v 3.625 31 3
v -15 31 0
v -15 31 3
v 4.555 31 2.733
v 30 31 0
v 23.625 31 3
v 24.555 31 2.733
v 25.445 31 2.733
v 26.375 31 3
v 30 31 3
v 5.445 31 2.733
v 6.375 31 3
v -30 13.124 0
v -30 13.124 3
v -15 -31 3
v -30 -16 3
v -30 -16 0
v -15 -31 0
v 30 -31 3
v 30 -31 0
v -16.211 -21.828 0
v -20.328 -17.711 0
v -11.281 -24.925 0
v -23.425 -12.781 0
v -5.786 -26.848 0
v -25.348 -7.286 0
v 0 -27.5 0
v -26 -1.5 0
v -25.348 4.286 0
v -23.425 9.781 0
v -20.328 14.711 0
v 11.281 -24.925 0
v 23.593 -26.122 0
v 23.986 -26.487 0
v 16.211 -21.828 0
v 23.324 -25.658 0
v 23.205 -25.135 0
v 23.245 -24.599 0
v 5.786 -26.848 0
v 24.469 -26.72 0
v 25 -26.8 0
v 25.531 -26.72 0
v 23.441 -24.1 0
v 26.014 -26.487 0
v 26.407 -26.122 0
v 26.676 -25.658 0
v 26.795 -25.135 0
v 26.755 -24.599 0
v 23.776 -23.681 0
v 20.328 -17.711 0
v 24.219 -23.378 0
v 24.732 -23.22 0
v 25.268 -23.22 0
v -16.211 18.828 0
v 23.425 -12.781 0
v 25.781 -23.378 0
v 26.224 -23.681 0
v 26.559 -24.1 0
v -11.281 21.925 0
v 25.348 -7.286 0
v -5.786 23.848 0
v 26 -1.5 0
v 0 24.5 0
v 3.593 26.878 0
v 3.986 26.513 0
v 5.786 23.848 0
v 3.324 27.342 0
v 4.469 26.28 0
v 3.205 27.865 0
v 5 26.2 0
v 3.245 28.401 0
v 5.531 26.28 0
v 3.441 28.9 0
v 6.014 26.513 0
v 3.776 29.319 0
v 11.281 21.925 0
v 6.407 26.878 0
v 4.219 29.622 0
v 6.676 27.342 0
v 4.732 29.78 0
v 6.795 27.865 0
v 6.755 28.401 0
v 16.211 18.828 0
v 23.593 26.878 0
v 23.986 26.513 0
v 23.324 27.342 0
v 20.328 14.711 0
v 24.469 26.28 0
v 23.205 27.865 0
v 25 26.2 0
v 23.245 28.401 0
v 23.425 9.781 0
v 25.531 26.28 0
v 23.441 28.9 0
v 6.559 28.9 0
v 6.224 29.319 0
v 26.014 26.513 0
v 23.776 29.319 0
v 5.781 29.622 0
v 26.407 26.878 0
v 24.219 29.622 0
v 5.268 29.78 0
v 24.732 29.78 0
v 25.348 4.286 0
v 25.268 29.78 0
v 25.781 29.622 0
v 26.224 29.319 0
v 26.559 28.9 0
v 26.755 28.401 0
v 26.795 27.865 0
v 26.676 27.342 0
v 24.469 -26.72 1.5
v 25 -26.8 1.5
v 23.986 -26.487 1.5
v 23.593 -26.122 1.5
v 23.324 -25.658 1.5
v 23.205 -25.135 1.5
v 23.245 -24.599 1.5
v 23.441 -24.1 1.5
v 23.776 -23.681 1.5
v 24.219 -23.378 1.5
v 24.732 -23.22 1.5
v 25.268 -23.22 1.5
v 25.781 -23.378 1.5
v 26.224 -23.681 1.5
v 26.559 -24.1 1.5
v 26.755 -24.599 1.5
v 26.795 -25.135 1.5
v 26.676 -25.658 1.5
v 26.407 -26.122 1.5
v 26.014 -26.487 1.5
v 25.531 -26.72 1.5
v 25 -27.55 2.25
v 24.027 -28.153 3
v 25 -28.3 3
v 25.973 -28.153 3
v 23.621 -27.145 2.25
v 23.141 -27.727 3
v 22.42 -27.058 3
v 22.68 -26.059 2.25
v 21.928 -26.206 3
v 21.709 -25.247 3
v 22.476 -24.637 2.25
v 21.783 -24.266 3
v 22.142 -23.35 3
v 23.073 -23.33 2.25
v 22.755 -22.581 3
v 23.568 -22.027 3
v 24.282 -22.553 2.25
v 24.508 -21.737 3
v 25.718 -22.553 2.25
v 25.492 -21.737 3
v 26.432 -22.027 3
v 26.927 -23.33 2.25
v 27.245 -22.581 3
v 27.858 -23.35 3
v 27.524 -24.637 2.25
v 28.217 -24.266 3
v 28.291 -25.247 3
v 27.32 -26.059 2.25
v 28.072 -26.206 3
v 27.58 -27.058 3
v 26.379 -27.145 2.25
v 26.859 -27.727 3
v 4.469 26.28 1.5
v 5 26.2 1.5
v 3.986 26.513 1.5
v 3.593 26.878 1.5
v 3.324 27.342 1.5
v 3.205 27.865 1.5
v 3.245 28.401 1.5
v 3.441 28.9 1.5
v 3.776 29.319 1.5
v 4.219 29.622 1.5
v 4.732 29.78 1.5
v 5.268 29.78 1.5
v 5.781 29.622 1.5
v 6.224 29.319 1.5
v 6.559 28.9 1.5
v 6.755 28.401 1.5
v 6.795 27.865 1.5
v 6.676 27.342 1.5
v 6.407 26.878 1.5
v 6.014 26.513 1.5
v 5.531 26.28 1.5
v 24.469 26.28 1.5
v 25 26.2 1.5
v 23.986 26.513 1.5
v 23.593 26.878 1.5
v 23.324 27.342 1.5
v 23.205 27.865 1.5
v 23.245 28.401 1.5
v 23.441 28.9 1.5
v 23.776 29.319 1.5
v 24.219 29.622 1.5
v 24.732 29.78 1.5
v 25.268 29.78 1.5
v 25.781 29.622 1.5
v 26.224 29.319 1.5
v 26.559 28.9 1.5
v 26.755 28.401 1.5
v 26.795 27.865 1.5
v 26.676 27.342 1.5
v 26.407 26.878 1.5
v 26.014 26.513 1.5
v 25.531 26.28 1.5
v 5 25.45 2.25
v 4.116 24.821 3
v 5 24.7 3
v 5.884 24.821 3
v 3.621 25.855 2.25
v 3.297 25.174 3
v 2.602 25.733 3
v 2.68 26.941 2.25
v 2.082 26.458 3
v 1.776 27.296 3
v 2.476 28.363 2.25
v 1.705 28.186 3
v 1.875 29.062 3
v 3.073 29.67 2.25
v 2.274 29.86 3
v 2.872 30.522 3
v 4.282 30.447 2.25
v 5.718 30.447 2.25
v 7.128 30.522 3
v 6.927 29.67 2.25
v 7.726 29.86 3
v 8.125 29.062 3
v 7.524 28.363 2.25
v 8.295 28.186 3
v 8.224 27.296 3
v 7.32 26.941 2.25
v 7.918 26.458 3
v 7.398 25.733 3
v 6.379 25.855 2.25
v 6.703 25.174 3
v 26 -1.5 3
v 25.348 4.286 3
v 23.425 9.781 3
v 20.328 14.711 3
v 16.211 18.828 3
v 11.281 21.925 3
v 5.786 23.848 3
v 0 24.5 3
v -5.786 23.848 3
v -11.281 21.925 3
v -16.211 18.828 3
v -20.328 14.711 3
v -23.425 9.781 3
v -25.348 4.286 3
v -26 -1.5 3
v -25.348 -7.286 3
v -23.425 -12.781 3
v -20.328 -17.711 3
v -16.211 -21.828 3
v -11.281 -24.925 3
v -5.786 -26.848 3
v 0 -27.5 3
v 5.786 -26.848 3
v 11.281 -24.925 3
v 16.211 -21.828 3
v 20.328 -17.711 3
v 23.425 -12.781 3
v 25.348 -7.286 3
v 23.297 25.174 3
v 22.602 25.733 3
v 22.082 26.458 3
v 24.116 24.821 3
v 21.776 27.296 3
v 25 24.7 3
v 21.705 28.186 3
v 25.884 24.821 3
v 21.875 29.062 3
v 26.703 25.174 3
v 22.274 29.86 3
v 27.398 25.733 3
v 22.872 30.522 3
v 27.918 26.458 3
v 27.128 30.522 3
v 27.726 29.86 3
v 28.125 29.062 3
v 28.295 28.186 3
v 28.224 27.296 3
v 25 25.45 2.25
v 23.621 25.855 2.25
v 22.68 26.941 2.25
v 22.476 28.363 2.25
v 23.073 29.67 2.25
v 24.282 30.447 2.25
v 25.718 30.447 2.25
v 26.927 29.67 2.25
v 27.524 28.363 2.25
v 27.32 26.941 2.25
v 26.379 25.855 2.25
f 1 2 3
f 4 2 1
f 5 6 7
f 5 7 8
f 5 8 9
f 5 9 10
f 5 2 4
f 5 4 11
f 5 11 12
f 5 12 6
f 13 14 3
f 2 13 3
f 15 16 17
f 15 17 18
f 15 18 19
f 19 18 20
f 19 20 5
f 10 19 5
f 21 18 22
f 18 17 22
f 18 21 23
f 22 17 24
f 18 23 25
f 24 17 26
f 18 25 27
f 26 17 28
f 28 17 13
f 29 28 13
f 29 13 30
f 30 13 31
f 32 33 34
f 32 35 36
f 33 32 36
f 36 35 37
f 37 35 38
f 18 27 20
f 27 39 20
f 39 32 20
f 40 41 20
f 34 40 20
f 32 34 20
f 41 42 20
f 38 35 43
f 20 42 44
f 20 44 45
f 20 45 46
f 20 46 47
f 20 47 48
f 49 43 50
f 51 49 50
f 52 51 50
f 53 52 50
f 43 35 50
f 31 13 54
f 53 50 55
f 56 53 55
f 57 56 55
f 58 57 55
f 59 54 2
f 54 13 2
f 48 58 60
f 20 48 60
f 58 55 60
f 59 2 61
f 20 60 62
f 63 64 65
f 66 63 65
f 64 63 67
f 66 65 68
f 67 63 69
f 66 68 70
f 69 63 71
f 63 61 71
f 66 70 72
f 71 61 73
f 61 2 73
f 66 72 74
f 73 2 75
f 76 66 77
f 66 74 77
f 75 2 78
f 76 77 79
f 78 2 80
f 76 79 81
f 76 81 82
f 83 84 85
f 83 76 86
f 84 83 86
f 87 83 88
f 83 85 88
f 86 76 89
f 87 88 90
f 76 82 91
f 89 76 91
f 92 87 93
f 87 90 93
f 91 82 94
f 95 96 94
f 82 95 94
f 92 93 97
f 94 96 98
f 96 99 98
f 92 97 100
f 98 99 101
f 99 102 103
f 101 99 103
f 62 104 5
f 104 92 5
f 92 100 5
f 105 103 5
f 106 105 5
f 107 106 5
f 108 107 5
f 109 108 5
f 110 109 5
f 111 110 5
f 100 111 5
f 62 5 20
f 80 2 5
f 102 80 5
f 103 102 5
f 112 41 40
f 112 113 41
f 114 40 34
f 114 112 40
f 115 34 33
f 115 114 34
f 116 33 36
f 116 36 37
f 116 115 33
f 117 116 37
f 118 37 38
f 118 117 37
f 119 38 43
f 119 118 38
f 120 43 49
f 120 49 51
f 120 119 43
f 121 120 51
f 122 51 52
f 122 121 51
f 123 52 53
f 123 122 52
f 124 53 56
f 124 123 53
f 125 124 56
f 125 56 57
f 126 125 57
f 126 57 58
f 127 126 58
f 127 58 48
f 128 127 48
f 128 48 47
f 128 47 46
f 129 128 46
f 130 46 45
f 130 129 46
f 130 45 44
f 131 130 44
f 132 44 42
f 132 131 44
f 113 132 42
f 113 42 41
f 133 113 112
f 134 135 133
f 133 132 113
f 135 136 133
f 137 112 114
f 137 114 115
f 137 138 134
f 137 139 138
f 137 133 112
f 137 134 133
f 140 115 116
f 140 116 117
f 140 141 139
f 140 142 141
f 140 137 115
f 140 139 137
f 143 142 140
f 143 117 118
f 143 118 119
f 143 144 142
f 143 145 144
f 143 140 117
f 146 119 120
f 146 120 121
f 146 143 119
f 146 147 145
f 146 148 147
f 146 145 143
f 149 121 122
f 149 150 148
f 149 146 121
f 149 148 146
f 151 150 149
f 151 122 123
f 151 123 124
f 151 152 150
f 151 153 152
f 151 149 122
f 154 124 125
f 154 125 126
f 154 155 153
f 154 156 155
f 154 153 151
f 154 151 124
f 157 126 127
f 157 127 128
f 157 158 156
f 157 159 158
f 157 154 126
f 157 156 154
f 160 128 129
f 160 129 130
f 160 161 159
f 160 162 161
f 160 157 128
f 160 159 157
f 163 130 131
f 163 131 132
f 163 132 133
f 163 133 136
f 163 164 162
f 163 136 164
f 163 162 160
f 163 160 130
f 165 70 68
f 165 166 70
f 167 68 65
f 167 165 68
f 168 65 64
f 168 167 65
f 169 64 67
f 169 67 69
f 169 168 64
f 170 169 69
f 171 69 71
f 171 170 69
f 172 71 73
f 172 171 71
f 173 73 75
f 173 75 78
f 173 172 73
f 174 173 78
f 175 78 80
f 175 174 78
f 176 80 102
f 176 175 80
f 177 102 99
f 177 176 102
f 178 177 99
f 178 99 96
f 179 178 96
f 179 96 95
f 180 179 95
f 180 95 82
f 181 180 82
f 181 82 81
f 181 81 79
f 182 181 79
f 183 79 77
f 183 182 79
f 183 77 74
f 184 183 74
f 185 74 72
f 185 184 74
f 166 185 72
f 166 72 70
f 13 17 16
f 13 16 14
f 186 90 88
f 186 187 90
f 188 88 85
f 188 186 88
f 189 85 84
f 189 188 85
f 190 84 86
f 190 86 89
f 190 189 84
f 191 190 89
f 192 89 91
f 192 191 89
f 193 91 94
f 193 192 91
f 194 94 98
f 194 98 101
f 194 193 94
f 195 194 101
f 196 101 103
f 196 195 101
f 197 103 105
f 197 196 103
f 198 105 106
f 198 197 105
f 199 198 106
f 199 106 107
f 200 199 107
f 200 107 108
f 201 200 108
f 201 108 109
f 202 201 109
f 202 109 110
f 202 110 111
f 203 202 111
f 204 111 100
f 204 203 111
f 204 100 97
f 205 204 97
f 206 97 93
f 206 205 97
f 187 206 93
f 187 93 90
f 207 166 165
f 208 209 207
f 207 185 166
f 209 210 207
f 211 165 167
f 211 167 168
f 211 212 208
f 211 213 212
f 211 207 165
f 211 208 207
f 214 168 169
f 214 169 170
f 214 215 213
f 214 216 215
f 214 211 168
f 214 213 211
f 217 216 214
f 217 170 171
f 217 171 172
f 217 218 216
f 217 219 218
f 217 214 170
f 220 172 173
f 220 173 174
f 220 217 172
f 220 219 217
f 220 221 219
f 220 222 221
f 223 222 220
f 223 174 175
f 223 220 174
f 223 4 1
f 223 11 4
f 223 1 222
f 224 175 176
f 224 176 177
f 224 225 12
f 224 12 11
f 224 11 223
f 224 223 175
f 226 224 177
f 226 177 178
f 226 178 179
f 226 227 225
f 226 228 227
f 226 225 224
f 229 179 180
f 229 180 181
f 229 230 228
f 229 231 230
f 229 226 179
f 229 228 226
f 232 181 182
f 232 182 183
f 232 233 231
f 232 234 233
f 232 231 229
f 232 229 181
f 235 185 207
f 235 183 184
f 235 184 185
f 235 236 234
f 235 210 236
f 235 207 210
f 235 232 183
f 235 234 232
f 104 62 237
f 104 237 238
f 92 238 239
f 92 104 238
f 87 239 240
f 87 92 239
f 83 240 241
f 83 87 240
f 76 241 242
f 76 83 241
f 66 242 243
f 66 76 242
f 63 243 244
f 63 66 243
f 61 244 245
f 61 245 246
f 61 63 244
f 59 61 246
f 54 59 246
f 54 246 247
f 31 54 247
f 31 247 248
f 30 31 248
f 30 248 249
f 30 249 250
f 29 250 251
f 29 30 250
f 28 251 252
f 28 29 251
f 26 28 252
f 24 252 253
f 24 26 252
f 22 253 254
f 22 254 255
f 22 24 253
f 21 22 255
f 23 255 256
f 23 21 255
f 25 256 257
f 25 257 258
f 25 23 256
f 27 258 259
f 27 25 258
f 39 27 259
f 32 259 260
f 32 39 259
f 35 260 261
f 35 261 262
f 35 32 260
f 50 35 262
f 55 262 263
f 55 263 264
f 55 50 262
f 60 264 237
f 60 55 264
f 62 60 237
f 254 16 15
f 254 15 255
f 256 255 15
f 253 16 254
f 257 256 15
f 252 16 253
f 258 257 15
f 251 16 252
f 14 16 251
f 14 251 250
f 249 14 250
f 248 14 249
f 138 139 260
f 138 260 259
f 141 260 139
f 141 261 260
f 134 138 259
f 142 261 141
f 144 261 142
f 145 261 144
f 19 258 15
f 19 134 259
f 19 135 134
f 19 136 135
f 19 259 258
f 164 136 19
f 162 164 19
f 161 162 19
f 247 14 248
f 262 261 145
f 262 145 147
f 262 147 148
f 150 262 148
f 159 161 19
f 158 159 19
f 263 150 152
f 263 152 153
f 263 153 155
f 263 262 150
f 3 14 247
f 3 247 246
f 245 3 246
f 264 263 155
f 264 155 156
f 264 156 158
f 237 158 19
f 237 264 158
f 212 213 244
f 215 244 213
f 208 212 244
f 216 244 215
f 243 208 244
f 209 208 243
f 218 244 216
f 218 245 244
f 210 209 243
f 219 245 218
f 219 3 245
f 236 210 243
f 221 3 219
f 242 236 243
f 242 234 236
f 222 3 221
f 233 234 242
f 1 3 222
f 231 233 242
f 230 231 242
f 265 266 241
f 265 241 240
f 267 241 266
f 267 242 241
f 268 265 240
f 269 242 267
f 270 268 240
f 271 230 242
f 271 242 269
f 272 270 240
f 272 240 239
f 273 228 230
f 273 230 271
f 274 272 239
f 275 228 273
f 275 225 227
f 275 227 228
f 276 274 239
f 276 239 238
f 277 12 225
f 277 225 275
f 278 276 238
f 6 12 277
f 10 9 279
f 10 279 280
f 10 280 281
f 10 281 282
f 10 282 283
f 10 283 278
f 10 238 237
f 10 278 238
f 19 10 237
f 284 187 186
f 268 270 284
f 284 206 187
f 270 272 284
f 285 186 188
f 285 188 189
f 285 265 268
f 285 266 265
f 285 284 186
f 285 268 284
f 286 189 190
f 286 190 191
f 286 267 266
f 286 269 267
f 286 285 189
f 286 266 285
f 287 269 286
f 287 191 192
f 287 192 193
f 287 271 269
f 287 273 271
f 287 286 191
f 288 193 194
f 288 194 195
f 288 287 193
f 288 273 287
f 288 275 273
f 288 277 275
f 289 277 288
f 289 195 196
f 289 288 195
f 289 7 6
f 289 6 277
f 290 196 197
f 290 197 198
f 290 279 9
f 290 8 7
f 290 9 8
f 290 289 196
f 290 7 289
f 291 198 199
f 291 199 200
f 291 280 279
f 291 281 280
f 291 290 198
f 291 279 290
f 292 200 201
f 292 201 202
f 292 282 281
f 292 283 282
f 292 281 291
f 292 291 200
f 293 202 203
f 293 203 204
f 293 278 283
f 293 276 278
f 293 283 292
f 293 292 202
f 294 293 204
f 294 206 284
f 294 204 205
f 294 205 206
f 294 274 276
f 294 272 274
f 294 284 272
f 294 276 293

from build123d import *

# Parameters (mm, degrees)
SKETCH_1_W                  = 60
SKETCH_1_H                  = 62
SKETCH_1_R                  = 26
SKETCH_1_R_2                = 1.6
EXTRUDE_1_DEPTH             = 3
CUT_EXTRUDE_1_DEPTH         = 44.243496621
CUT_EXTRUDE_2_REACH         = 45.243
SKETCH_5_R                  = 1.6
CUT_EXTRUDE_3_DEPTH         = 44.243496621
HOLE_WIZARD_M3_1_AT_2_COUNT = 2
HOLE_WIZARD_M3_1_AT_2_PITCH = 20
HOLE_WIZARD_M3_1_AT_3_COUNT = 2
HOLE_WIZARD_M3_1_AT_3_PITCH = 56.648036153


with BuildPart() as part:
    # 草图1 → 凸台-拉伸1 (new body)
    with BuildSketch(Plane.XY):
        Rectangle(SKETCH_1_W, SKETCH_1_H)
        with Locations((0, -1.5)):
            Circle(SKETCH_1_R, mode=Mode.SUBTRACT)
        with Locations((25, 28)):
            Circle(SKETCH_1_R_2, mode=Mode.SUBTRACT)
        with Locations((5, 28)):
            Circle(SKETCH_1_R_2, mode=Mode.SUBTRACT)
    extrude(amount=EXTRUDE_1_DEPTH)

    # 草图2 → 切除-拉伸1 (cut, through all)
    with BuildSketch(Plane.XY.offset(3)):
        Polygon((-30, 13.123696111), (-15, 31), (-30, 31), align=None)
    extrude(amount=-CUT_EXTRUDE_1_DEPTH, mode=Mode.SUBTRACT)

    # 草图4 → 切除-拉伸2 (cut, up to next)
    with BuildSketch(Plane.XY.offset(3), mode=Mode.PRIVATE) as cut_extrude_2_sk1:
        Polygon((-30, -16), (-15, -31), (-30, -31), align=None)
    cut_extrude_2_tool1 = extrude(cut_extrude_2_sk1.sketch, amount=-CUT_EXTRUDE_2_REACH, mode=Mode.PRIVATE) & part.part
    add(cut_extrude_2_tool1.solids().sort_by_distance((-25, -26, 3))[0], mode=Mode.SUBTRACT)

    # 草图5 → 切除-拉伸3 (cut, through all)
    with BuildSketch(Plane.XY.offset(3)):
        with Locations((25, -25)):
            Circle(SKETCH_5_R)
    extrude(amount=-CUT_EXTRUDE_3_DEPTH, mode=Mode.SUBTRACT)

    # 草图7 → M3 十字槽半沉头木螺钉的锥形沉头孔1 (revolve, cut)
    with BuildSketch(Plane(origin=(5, 28, 3), x_dir=(0, -1, 0), z_dir=(1, 0, 0))):
        Polygon((0, 0), (0, 3), (1.8, 3), (1.8, 1.5), (3.3, 0), align=None)
    hole_wizard_m3_1 = revolve(axis=Axis((5, 28, 9.35), (0, 0, -1)), mode=Mode.SUBTRACT)

    # M3 十字槽半沉头木螺钉的锥形沉头孔1 at 2: M3 十字槽半沉头木螺钉的锥形沉头孔1 ×2
    with Locations(*[(i * HOLE_WIZARD_M3_1_AT_2_PITCH, 0, 0) for i in range(1, HOLE_WIZARD_M3_1_AT_2_COUNT)]):
        add(hole_wizard_m3_1, mode=Mode.SUBTRACT)

    # M3 十字槽半沉头木螺钉的锥形沉头孔1 at 3: M3 十字槽半沉头木螺钉的锥形沉头孔1 ×2
    with Locations(*[Vector(0.35305725243424246, -0.9356017189507422, 0) * (i * HOLE_WIZARD_M3_1_AT_3_PITCH) for i in range(1, HOLE_WIZARD_M3_1_AT_3_COUNT)]):
        add(hole_wizard_m3_1, mode=Mode.SUBTRACT)


solid = part.part
